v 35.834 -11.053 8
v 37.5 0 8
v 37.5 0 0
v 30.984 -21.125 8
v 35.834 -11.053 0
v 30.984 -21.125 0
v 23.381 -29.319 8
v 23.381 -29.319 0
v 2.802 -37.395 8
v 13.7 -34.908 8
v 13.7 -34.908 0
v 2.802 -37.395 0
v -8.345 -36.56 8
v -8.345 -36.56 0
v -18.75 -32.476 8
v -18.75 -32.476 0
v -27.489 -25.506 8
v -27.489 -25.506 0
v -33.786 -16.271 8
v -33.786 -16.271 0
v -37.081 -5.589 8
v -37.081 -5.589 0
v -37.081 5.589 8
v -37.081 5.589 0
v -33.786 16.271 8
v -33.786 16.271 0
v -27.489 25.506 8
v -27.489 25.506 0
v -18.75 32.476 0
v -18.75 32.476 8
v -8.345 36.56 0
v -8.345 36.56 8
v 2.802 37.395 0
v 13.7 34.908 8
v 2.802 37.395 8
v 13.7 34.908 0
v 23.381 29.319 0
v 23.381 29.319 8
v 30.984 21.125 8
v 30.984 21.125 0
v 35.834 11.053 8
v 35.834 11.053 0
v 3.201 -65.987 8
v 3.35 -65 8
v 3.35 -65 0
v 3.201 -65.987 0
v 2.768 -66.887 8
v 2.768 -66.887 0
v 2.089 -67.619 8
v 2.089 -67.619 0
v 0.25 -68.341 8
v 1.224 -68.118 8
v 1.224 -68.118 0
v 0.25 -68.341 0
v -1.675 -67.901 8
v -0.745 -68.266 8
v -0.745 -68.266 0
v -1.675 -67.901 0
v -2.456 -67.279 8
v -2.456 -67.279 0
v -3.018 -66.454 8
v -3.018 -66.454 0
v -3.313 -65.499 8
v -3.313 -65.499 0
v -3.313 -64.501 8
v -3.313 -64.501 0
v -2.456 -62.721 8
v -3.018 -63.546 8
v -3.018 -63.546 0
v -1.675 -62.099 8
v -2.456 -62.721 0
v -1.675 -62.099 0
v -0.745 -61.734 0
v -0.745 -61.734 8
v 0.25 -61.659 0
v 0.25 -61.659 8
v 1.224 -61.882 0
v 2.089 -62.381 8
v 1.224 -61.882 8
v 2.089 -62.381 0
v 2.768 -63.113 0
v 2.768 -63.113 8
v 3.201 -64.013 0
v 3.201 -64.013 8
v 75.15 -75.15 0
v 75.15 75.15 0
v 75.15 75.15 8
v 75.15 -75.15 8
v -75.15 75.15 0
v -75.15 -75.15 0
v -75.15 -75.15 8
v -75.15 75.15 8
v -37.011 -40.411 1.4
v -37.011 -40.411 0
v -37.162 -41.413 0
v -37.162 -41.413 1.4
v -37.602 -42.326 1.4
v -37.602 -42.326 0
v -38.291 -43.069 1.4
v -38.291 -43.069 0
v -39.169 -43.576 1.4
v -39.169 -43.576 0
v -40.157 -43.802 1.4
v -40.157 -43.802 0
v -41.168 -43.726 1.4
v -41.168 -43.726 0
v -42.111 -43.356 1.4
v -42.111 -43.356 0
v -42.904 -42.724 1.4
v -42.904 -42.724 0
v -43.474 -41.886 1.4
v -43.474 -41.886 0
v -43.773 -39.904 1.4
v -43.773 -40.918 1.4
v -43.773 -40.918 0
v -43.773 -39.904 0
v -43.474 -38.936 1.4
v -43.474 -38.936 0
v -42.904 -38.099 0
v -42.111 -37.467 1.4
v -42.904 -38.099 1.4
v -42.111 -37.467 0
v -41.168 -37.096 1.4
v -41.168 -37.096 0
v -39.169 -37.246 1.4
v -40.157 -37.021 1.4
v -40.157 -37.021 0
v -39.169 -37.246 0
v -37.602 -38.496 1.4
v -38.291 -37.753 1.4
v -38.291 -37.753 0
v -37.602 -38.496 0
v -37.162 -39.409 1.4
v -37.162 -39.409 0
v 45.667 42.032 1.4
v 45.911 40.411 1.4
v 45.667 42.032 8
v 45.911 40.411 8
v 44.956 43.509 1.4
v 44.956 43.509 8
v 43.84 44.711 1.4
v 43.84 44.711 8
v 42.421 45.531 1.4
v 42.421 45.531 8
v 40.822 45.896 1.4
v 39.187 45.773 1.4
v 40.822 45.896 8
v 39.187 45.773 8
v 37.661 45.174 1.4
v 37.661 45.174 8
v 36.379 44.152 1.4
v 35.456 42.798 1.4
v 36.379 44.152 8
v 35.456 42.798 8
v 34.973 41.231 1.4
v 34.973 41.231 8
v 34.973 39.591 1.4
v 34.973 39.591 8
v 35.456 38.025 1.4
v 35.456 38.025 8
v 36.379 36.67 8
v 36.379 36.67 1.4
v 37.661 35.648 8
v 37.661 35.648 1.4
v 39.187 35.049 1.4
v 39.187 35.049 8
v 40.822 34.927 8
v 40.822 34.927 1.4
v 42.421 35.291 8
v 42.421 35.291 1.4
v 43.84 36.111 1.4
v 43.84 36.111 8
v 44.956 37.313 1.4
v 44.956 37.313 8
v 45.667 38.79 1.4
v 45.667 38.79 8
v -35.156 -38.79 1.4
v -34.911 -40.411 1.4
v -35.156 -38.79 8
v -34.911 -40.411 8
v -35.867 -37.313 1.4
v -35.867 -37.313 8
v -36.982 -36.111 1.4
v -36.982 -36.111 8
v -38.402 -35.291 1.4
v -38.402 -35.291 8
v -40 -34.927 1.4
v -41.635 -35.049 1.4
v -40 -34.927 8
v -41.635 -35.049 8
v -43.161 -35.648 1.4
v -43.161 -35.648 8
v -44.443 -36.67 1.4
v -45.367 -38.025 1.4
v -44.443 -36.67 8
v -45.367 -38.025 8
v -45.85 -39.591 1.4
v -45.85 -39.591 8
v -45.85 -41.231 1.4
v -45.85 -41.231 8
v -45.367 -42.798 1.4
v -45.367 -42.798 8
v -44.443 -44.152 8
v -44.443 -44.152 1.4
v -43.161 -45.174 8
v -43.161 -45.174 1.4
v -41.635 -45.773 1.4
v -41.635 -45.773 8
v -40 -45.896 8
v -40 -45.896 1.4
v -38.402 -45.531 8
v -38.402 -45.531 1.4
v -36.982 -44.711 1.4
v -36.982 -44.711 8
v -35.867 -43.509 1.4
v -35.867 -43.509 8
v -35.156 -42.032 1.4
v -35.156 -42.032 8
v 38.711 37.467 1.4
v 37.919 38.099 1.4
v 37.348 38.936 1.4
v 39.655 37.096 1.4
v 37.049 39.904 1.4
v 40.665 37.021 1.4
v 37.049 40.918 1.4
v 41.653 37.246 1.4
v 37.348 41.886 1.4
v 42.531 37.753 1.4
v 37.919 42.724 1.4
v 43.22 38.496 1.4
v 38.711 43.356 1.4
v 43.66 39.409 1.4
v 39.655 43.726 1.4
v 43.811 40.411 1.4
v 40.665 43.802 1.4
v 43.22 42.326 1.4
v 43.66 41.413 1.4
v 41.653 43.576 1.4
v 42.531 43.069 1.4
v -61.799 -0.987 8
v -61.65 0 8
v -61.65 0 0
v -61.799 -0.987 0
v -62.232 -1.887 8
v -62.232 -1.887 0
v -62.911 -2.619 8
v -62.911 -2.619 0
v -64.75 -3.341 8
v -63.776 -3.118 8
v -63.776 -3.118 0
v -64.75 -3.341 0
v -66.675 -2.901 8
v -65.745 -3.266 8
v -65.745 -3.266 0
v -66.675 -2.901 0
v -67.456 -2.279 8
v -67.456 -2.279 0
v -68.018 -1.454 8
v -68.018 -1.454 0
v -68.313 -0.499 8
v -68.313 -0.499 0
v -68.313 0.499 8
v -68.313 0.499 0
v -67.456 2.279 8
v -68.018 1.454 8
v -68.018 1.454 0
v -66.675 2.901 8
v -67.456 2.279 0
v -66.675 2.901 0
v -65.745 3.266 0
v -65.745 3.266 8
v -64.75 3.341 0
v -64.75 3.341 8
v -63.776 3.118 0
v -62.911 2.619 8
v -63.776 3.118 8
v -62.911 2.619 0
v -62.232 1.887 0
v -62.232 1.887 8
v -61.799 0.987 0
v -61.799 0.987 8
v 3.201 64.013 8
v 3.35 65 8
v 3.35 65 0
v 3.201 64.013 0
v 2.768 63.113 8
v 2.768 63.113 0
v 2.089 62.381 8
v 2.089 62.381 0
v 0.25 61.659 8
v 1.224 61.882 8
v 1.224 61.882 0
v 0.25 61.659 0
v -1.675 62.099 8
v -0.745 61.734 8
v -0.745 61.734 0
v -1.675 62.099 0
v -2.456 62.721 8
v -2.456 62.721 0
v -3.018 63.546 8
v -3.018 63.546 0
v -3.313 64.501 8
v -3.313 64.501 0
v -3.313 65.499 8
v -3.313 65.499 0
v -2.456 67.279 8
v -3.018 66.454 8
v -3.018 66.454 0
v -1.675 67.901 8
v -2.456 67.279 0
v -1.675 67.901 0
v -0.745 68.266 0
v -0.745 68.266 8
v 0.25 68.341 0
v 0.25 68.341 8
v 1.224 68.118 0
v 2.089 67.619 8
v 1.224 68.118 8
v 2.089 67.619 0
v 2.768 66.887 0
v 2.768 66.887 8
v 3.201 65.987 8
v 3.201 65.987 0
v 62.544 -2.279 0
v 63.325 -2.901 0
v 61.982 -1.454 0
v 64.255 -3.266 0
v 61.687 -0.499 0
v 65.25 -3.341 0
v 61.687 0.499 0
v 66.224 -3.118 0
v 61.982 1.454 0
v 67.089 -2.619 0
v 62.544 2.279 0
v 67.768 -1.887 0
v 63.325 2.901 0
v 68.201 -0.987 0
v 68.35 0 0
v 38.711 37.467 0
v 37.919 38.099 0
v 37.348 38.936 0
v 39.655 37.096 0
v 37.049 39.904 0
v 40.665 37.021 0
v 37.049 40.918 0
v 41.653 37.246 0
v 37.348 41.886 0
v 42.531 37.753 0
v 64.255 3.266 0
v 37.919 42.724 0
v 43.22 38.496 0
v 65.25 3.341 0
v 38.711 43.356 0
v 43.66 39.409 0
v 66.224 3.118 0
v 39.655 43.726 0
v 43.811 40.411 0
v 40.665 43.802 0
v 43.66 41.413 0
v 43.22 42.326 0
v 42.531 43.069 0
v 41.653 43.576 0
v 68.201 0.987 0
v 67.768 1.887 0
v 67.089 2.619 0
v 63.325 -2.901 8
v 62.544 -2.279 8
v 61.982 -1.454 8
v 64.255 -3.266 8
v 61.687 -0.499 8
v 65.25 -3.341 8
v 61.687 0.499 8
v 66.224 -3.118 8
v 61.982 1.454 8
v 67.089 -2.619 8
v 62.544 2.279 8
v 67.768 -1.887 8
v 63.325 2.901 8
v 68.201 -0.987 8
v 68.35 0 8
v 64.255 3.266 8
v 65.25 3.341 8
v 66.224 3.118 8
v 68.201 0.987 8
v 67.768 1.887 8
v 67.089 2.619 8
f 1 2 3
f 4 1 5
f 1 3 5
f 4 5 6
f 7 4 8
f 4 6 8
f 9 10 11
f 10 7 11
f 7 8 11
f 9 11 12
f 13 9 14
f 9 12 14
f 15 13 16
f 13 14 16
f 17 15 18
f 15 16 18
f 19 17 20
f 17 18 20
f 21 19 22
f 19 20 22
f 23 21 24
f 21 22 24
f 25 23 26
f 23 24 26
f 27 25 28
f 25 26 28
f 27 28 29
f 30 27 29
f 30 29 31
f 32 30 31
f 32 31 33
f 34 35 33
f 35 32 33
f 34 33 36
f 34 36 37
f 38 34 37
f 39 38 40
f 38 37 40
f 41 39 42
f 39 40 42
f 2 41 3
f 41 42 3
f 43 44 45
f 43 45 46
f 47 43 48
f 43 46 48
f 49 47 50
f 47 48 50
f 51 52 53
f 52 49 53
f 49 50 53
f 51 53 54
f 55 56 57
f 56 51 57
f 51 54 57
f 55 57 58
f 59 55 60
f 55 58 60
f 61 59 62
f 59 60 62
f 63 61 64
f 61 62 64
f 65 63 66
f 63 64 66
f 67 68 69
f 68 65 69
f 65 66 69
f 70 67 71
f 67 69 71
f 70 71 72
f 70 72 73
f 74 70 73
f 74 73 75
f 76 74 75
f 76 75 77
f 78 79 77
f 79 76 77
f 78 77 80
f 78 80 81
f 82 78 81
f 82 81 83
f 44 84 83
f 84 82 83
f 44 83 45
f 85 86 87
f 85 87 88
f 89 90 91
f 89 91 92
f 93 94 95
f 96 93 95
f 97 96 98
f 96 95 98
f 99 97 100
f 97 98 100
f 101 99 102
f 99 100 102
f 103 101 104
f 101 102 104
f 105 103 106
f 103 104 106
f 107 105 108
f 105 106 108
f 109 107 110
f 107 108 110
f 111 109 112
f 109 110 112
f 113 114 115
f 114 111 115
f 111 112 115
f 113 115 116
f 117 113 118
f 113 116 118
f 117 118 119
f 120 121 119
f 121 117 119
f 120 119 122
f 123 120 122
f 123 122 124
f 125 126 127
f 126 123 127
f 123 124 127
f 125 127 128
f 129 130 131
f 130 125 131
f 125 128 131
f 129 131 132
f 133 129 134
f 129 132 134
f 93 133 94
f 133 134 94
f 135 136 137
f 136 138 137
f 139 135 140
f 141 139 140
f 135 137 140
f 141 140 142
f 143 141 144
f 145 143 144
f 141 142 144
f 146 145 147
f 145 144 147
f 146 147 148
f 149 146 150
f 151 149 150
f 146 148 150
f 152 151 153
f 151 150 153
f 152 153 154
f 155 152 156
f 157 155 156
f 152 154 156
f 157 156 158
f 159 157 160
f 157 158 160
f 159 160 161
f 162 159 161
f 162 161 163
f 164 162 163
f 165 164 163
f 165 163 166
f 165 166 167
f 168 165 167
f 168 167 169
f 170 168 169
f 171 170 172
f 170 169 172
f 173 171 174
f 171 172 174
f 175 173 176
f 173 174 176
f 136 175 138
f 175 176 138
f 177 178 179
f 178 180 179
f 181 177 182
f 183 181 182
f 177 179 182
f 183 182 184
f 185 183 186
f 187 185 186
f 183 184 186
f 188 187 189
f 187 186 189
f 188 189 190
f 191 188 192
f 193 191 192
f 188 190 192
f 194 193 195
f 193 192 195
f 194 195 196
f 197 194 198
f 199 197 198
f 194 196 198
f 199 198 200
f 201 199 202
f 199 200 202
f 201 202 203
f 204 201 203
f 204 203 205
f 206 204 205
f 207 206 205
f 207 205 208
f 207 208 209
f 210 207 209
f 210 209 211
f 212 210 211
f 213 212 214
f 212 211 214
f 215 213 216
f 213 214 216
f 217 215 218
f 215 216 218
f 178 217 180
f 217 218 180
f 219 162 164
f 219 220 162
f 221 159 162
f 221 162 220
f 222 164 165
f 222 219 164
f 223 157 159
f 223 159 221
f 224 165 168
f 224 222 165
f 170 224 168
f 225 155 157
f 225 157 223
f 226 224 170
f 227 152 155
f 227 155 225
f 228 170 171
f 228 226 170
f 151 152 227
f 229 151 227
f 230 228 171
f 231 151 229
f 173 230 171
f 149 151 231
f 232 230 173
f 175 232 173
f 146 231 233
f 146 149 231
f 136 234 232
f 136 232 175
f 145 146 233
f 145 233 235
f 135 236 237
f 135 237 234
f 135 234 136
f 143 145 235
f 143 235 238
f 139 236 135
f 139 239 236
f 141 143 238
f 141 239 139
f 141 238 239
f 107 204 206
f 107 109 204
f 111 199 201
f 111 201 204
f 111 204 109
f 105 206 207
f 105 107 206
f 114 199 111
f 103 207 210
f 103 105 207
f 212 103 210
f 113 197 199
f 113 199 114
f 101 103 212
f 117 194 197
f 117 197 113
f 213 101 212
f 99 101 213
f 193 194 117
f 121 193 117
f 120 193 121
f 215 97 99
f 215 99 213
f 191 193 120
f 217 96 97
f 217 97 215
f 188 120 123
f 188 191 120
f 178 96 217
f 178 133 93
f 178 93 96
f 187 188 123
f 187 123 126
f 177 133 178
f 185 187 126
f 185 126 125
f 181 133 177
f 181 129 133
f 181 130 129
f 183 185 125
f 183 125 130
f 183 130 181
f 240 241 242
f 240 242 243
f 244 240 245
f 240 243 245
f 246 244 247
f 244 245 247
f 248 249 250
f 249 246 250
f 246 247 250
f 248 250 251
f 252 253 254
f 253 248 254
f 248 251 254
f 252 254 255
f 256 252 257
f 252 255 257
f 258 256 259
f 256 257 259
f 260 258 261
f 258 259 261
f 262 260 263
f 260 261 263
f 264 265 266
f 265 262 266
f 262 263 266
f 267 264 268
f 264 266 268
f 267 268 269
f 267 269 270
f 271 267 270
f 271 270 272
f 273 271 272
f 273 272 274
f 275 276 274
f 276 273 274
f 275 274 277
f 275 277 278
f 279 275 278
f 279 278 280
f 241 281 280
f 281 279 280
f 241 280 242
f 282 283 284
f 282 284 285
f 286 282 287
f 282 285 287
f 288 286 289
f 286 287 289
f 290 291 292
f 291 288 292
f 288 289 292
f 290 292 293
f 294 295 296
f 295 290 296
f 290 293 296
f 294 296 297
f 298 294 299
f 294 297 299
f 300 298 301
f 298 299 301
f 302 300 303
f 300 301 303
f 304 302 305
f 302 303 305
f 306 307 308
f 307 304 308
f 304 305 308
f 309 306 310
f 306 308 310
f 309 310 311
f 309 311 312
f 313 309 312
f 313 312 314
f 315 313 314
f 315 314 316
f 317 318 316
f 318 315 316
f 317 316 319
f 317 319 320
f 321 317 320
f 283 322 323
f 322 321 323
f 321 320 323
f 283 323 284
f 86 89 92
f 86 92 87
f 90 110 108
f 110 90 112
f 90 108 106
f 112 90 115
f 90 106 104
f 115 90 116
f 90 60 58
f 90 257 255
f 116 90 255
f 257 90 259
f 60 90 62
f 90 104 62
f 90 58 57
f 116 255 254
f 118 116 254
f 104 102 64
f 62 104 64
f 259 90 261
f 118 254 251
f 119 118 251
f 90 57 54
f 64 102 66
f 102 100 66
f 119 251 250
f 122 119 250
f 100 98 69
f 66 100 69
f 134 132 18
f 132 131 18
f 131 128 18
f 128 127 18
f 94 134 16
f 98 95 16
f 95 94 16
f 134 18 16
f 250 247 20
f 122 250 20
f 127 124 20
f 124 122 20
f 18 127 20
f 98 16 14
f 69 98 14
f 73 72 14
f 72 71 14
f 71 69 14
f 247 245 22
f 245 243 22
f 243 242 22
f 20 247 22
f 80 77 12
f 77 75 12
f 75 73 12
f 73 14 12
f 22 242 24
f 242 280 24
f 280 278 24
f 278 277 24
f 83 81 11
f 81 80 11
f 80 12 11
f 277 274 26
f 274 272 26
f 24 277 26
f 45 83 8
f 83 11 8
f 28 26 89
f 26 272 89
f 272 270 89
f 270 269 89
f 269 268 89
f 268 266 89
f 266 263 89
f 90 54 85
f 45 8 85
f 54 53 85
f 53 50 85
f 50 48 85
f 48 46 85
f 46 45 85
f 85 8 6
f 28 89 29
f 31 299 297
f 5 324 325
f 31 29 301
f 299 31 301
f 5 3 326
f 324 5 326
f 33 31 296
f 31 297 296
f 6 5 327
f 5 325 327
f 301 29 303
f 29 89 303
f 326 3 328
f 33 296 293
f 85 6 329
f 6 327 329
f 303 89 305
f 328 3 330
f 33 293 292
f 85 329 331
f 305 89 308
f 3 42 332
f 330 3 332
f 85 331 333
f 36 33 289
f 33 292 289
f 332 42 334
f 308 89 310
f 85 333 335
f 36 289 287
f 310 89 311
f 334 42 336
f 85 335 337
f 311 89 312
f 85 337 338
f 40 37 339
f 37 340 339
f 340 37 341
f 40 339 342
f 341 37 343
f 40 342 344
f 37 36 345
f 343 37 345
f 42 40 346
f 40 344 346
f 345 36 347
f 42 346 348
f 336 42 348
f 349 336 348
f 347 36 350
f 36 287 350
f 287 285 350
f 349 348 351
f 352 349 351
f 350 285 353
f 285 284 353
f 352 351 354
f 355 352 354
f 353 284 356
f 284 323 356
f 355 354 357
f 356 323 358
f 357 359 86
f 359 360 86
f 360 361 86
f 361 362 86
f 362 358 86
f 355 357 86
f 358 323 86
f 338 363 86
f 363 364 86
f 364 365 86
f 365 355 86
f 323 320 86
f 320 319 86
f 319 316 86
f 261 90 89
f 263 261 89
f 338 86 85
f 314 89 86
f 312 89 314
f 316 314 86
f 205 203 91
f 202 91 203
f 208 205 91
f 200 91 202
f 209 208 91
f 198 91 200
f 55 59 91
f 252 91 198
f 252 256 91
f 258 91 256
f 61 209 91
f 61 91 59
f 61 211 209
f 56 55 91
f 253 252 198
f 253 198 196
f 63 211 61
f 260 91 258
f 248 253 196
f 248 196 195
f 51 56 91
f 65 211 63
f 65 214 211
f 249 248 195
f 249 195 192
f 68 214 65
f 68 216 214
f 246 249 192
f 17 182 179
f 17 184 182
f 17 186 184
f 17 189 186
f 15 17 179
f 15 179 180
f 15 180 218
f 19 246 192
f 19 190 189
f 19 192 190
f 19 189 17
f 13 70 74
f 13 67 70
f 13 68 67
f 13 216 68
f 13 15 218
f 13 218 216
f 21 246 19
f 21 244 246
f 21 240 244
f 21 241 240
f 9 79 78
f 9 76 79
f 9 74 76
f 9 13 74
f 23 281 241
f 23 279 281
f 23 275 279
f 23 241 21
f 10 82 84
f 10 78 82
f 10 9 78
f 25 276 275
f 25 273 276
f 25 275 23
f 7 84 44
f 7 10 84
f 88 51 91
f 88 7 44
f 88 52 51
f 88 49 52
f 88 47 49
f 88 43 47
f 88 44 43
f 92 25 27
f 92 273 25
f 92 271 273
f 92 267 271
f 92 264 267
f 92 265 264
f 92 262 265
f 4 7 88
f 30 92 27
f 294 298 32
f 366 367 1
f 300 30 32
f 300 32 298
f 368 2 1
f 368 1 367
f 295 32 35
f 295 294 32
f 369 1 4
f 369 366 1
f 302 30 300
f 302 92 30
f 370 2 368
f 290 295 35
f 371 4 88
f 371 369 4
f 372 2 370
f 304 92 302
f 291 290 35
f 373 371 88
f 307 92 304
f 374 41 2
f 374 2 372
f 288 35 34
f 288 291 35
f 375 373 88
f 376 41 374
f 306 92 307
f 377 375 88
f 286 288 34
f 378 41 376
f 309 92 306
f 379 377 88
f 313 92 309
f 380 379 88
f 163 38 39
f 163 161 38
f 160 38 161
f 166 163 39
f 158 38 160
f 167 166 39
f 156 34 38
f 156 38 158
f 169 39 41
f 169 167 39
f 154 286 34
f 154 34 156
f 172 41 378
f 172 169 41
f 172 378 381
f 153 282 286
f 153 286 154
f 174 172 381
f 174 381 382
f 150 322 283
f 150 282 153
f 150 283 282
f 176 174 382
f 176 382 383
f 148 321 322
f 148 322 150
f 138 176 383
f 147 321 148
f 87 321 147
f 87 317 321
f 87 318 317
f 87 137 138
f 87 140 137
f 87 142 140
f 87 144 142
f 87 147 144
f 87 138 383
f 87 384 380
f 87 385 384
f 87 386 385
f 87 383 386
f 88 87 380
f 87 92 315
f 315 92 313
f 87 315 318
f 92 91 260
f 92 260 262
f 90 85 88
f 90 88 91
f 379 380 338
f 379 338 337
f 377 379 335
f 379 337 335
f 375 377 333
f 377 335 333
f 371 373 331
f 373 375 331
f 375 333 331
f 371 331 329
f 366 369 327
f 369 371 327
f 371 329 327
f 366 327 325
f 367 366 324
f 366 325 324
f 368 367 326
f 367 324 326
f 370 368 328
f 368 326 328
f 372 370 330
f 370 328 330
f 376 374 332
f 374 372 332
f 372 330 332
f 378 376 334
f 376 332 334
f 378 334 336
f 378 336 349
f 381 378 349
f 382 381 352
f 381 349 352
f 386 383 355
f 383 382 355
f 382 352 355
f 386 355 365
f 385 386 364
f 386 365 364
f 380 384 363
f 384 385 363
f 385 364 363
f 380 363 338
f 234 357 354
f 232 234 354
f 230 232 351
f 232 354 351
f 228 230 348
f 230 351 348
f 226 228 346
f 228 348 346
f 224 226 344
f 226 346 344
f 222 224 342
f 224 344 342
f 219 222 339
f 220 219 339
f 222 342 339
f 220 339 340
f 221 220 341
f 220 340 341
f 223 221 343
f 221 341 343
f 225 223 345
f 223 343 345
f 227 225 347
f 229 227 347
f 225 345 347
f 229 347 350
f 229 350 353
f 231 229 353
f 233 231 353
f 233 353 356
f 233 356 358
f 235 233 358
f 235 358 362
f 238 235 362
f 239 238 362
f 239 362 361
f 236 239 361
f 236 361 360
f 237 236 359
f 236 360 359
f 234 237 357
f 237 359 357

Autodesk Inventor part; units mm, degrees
ref_plane "YZ Plane" through (0, 0, 0) normal (1, 0, 0) x (0, 1, 0)
ref_plane "XZ Plane" through (0, 0, 0) normal (0, 1, 0) x (-1, 0, 0)
ref_plane "XY Plane" through (0, 0, 0) normal (0, 0, 1) x (1, 0, 0)
sketch "Sketch1" plane through (0, 0, 0) normal (0, 0, 1) x (1, 0, 0)
  line L0 (-75.15, 75.15) -> (75.15, 75.15)
  line L1 (75.15, 75.15) -> (75.15, -75.15)
  line L2 (75.15, -75.15) -> (-75.15, -75.15)
  line L3 (-75.15, -75.15) -> (-75.15, 75.15)
  circle A0 centre (40.4112, 40.4112) radius 3.4
  circle A1 centre (-40.4112, -40.4112) radius 3.4
  circle A2 centre (-65, 0) radius 3.35
  circle A3 centre (0, -65) radius 3.35
  circle A4 centre (0, 65) radius 3.35
  circle A5 centre (65, 0) radius 3.35
  circle A6 centre (0, 0) radius 65 construction
  circle A7 centre (0, 0) radius 37.5
  circle A8 centre (0, 0) radius 57.15 construction
  line L4 (40.4112, 40.4112) -> (-40.4112, -40.4112) construction
  point P0 (0, 75.15)
  point P1 (75.15, 0)
  dimension "d14" = 150.3
  dimension "d26" = 6.7
  dimension "d32" = 130
  dimension "d33" = 75
  dimension "d40" = 114.3
  dimension "d42" = 6.8
  dimension "d43" = 45
extrude "Extrusion1" add sketch "Sketch1" along normal blind 8
sketch "Sketch2" plane through (0, 0, 8) normal (0, 0, 1) x (1, 0, 0)
  circle A0 centre (40.4112, 40.4112) radius 3.4 projected
  circle A1 centre (40.4112, 40.4112) radius 5.5
  circle A2 centre (-40.4112, -40.4112) radius 3.4 projected
  circle A3 centre (-40.4112, -40.4112) radius 5.5
  point P0 (0, 0)
  dimension "d46" = 11
extrude "Extrusion2" cut sketch "Sketch2" against normal blind 6.6 contours A0 | A1 | A3
properties part number "FLI-Al-Plate" material "Aluminum 6061"
